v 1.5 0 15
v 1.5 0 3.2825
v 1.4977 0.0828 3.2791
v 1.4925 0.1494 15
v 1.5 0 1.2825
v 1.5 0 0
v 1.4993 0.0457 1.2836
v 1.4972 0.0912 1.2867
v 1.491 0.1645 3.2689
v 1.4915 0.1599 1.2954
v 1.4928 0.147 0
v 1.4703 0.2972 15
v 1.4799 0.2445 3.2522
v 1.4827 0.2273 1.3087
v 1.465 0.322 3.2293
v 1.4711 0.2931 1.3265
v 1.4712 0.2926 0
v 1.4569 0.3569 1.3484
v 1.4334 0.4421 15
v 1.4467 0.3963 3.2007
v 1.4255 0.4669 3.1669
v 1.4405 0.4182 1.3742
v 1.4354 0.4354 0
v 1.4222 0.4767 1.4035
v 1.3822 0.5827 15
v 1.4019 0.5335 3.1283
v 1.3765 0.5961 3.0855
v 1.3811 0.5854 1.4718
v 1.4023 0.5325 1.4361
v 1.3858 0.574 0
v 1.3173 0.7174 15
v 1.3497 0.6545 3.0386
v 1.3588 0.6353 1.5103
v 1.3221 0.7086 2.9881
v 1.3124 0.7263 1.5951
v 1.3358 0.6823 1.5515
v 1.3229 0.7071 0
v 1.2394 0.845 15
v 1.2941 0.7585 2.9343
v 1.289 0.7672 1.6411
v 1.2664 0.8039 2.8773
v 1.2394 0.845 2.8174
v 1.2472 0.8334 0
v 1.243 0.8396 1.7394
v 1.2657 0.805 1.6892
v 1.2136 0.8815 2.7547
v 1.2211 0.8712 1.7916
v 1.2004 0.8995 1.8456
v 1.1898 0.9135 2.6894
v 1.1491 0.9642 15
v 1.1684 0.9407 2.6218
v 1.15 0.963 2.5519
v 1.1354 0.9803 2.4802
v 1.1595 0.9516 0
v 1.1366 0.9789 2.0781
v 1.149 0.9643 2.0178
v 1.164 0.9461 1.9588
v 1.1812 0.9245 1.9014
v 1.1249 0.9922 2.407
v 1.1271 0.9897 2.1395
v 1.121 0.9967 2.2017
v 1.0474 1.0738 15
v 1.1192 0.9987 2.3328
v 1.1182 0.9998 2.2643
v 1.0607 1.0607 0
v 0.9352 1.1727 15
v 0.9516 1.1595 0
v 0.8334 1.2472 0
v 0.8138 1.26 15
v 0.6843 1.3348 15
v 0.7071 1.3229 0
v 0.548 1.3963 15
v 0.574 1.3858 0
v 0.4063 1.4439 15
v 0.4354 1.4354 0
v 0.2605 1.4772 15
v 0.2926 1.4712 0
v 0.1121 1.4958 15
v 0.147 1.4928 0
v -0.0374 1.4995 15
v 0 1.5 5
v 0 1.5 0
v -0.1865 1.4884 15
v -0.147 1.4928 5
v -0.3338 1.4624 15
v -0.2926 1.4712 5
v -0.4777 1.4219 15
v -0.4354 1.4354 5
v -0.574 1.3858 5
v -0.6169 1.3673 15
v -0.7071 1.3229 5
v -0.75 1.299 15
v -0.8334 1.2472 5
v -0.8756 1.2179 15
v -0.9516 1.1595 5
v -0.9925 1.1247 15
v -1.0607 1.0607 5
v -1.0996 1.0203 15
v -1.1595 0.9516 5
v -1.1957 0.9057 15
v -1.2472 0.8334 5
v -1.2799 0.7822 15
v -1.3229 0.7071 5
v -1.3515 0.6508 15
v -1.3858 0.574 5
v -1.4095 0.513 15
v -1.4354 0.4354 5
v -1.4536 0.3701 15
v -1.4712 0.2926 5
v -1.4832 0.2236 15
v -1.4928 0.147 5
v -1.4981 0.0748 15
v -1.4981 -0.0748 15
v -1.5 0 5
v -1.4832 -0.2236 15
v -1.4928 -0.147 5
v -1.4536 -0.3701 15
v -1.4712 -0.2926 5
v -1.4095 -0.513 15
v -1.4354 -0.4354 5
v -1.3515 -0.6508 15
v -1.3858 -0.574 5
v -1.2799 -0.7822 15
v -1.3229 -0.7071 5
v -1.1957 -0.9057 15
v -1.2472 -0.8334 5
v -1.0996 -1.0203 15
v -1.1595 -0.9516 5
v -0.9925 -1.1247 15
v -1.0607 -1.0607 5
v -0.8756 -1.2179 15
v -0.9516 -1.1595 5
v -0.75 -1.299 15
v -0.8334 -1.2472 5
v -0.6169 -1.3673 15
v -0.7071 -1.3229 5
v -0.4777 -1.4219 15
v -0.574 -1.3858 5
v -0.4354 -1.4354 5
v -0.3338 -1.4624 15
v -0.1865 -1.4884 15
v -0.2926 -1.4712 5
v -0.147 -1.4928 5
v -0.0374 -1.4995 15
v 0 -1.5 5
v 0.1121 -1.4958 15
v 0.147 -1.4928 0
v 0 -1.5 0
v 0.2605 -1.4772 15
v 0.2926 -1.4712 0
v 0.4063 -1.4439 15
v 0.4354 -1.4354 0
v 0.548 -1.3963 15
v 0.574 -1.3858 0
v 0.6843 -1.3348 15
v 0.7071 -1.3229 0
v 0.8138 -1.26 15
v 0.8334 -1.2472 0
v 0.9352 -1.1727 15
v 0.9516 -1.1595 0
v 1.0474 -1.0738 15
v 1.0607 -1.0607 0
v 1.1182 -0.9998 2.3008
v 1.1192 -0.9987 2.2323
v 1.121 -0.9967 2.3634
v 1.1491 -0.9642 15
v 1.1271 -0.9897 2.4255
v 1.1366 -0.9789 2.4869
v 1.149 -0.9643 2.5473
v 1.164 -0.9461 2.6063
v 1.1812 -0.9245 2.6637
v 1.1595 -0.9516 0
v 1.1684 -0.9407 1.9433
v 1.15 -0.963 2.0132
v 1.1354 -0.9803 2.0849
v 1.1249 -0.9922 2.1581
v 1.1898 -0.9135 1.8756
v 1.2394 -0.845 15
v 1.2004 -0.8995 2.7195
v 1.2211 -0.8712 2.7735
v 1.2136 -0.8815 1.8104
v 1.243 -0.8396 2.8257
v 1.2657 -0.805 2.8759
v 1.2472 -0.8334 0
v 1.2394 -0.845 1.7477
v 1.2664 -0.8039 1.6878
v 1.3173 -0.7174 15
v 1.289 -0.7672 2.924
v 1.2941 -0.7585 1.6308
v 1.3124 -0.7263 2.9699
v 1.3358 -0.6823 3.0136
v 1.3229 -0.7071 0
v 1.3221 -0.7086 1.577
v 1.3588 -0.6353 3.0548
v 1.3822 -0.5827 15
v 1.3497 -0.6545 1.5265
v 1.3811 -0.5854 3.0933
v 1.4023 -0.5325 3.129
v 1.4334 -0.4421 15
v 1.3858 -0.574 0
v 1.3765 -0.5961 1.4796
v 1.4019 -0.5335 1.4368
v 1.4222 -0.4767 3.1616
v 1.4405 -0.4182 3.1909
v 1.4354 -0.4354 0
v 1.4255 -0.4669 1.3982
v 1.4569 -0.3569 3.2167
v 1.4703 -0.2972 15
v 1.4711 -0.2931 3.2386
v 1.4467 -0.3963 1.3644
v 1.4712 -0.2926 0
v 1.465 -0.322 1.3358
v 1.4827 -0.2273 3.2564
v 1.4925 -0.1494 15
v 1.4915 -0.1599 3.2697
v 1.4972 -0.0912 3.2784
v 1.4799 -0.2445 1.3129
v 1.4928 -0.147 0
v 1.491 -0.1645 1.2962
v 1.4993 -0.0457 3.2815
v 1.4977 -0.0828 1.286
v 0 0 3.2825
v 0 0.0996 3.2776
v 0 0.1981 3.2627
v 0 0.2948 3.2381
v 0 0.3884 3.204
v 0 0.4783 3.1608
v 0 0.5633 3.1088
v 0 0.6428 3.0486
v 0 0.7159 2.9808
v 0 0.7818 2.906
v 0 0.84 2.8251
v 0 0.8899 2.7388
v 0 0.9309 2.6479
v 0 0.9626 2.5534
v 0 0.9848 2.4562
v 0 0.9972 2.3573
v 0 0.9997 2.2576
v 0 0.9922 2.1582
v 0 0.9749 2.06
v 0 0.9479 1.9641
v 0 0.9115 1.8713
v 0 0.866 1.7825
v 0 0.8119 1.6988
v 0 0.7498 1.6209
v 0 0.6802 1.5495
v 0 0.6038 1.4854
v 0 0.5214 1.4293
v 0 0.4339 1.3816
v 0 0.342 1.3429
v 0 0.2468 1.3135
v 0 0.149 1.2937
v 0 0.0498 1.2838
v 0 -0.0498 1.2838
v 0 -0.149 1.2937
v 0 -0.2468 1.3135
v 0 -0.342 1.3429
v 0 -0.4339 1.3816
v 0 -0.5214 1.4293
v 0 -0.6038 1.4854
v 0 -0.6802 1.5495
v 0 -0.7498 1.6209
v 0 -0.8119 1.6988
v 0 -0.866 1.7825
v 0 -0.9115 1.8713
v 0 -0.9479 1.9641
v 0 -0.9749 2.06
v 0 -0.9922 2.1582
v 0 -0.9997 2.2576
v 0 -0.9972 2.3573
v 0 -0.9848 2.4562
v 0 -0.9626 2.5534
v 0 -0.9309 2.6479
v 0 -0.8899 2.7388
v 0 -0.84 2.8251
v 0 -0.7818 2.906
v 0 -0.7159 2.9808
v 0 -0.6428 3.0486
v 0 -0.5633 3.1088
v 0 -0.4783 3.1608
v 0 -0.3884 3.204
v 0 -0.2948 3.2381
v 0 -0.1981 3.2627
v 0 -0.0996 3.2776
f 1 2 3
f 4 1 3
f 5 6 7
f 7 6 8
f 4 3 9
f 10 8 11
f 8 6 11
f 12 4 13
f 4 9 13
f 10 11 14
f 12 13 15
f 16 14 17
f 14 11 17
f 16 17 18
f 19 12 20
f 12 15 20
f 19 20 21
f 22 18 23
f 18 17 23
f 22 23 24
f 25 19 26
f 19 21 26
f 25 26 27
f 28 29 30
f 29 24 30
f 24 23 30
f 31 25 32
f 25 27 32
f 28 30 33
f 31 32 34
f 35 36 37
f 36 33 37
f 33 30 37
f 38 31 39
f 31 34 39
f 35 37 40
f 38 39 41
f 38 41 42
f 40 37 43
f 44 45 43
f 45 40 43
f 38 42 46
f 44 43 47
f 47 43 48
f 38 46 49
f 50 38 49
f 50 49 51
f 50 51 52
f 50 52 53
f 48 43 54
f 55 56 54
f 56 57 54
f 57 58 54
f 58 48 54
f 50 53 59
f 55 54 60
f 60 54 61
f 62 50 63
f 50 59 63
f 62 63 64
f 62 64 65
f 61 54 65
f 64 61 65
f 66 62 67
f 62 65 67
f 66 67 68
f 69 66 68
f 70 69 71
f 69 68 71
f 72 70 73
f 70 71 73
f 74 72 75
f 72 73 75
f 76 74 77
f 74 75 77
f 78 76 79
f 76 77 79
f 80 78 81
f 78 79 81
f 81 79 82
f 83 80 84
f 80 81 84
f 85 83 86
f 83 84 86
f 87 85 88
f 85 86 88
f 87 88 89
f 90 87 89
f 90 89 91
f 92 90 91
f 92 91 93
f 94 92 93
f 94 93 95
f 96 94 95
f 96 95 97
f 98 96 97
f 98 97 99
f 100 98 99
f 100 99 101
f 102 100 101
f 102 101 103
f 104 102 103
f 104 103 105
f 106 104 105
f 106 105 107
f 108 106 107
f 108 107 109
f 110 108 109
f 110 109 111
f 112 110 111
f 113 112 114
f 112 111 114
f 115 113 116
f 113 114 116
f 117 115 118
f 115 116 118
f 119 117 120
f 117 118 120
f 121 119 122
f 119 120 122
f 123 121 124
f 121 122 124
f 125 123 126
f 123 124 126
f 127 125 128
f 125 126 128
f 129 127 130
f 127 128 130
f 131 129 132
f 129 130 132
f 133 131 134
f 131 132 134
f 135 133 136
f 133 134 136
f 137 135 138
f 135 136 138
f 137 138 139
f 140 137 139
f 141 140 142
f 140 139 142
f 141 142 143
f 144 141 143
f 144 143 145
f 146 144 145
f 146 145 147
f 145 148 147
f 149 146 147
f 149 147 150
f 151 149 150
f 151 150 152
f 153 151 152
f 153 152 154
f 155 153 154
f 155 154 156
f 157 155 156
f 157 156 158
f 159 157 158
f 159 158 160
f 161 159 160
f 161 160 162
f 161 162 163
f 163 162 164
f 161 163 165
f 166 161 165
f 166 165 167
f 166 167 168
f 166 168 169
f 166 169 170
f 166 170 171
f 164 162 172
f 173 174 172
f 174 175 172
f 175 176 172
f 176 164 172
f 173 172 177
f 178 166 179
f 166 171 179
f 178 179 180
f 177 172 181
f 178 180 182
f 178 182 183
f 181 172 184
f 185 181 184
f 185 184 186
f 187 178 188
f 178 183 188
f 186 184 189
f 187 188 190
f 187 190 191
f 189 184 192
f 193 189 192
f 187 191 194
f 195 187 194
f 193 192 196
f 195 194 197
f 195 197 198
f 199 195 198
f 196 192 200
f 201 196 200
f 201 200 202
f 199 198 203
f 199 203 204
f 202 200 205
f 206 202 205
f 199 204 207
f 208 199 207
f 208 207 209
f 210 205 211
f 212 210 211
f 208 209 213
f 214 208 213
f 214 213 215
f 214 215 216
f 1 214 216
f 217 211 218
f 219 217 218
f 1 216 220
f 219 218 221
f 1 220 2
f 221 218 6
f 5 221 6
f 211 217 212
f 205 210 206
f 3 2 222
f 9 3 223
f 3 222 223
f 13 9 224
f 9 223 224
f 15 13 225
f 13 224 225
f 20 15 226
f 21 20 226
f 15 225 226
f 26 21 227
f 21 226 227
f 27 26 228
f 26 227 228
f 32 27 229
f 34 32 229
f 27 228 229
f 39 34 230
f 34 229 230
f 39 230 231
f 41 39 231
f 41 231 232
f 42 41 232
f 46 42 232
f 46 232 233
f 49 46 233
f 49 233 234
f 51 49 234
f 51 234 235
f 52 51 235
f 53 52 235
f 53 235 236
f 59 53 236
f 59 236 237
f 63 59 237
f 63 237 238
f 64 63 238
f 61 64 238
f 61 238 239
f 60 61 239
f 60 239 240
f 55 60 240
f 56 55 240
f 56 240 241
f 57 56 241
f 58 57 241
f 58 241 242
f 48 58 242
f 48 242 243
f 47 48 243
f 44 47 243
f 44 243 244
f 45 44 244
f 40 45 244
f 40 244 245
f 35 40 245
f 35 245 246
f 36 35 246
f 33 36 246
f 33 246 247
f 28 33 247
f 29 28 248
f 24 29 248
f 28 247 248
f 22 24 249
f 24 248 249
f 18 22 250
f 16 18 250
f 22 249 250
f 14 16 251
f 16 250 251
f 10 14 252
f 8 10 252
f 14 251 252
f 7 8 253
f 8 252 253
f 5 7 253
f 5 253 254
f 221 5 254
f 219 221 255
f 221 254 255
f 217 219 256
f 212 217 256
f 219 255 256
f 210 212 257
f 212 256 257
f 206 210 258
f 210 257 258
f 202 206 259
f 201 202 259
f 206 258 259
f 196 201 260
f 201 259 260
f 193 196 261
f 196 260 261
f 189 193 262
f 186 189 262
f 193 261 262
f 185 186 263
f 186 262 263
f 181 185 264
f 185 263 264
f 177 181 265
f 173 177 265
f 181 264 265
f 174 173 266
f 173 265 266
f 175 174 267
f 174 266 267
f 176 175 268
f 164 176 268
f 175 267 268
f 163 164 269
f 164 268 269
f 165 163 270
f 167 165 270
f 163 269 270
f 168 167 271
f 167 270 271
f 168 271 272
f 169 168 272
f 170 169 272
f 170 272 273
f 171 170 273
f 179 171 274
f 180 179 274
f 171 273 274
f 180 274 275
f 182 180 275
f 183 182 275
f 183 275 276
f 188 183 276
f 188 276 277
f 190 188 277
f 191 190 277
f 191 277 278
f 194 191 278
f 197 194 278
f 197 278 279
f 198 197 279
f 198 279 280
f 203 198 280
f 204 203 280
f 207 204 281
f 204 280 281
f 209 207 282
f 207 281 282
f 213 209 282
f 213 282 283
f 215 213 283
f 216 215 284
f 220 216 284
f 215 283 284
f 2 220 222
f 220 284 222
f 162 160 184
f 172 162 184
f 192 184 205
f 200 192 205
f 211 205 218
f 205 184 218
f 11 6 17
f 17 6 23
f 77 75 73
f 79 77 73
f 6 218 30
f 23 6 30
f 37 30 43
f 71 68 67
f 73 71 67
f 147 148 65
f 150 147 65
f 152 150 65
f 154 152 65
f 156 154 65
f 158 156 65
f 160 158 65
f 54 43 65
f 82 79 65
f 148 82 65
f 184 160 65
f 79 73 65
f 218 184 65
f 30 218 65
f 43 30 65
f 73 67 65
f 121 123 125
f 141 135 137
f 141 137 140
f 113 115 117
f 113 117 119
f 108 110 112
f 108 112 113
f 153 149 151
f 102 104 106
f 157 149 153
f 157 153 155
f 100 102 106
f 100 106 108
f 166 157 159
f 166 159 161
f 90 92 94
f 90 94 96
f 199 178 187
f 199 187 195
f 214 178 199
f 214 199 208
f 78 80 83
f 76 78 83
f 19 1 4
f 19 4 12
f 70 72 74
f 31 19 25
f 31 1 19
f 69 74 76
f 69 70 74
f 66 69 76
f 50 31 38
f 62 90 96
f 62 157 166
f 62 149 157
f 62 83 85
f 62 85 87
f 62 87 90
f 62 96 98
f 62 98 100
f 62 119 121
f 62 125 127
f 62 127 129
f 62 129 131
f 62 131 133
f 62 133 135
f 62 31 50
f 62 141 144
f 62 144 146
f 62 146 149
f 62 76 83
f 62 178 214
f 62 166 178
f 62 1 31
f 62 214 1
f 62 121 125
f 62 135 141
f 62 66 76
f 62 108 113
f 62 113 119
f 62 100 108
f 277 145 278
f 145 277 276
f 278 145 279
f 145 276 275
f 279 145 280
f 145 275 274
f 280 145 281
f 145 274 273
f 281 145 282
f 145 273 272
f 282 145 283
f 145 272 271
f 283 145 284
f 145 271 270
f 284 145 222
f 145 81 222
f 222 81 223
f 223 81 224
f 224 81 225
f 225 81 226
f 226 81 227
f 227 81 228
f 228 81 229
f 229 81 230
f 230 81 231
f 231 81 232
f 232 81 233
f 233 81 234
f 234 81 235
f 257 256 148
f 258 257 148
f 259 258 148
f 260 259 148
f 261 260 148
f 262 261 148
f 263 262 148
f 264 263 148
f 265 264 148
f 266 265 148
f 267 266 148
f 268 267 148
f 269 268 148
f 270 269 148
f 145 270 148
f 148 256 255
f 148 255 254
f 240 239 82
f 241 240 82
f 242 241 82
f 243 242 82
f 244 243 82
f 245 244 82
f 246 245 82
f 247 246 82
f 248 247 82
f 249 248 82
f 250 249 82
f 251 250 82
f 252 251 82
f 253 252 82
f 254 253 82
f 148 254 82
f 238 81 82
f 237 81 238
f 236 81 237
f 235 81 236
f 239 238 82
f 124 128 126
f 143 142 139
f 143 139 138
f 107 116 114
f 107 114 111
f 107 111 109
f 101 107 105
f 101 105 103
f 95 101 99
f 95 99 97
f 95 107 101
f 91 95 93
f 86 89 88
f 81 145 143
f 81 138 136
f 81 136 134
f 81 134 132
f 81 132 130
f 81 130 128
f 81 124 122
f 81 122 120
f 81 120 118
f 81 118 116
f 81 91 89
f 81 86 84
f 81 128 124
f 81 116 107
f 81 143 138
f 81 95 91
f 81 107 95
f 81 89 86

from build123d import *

# Parameters (mm, degrees)
SKETCH1_R           = 1.5
BOSS_EXTRUDE1_DEPTH = 15
SKETCH2_W           = 5
SKETCH2_H           = 4.697023624
CUT_EXTRUDE1_DEPTH  = 30
SKETCH3_R           = 1
CUT_EXTRUDE2_DEPTH  = 30


with BuildPart() as part:
    # Sketch1 → Boss-Extrude1 (new body)
    with BuildSketch(Plane.XY):
        Circle(SKETCH1_R)
    extrude(amount=BOSS_EXTRUDE1_DEPTH)

    # Sketch2 → Cut-Extrude1 (cut)
    with BuildSketch(Plane(origin=(0, 0, 0), x_dir=(0, 0, -1), z_dir=(1, 0, 0))):
        with Locations((-2.5, -0.042086347)):
            Rectangle(SKETCH2_W, SKETCH2_H)
    extrude(amount=-CUT_EXTRUDE1_DEPTH, mode=Mode.SUBTRACT)

    # Sketch3 → Cut-Extrude2 (cut)
    with BuildSketch(Plane.ZY):
        with Locations((2.282543491, 0)):
            Circle(SKETCH3_R)
    extrude(amount=-CUT_EXTRUDE2_DEPTH, mode=Mode.SUBTRACT)


solid = part.part
